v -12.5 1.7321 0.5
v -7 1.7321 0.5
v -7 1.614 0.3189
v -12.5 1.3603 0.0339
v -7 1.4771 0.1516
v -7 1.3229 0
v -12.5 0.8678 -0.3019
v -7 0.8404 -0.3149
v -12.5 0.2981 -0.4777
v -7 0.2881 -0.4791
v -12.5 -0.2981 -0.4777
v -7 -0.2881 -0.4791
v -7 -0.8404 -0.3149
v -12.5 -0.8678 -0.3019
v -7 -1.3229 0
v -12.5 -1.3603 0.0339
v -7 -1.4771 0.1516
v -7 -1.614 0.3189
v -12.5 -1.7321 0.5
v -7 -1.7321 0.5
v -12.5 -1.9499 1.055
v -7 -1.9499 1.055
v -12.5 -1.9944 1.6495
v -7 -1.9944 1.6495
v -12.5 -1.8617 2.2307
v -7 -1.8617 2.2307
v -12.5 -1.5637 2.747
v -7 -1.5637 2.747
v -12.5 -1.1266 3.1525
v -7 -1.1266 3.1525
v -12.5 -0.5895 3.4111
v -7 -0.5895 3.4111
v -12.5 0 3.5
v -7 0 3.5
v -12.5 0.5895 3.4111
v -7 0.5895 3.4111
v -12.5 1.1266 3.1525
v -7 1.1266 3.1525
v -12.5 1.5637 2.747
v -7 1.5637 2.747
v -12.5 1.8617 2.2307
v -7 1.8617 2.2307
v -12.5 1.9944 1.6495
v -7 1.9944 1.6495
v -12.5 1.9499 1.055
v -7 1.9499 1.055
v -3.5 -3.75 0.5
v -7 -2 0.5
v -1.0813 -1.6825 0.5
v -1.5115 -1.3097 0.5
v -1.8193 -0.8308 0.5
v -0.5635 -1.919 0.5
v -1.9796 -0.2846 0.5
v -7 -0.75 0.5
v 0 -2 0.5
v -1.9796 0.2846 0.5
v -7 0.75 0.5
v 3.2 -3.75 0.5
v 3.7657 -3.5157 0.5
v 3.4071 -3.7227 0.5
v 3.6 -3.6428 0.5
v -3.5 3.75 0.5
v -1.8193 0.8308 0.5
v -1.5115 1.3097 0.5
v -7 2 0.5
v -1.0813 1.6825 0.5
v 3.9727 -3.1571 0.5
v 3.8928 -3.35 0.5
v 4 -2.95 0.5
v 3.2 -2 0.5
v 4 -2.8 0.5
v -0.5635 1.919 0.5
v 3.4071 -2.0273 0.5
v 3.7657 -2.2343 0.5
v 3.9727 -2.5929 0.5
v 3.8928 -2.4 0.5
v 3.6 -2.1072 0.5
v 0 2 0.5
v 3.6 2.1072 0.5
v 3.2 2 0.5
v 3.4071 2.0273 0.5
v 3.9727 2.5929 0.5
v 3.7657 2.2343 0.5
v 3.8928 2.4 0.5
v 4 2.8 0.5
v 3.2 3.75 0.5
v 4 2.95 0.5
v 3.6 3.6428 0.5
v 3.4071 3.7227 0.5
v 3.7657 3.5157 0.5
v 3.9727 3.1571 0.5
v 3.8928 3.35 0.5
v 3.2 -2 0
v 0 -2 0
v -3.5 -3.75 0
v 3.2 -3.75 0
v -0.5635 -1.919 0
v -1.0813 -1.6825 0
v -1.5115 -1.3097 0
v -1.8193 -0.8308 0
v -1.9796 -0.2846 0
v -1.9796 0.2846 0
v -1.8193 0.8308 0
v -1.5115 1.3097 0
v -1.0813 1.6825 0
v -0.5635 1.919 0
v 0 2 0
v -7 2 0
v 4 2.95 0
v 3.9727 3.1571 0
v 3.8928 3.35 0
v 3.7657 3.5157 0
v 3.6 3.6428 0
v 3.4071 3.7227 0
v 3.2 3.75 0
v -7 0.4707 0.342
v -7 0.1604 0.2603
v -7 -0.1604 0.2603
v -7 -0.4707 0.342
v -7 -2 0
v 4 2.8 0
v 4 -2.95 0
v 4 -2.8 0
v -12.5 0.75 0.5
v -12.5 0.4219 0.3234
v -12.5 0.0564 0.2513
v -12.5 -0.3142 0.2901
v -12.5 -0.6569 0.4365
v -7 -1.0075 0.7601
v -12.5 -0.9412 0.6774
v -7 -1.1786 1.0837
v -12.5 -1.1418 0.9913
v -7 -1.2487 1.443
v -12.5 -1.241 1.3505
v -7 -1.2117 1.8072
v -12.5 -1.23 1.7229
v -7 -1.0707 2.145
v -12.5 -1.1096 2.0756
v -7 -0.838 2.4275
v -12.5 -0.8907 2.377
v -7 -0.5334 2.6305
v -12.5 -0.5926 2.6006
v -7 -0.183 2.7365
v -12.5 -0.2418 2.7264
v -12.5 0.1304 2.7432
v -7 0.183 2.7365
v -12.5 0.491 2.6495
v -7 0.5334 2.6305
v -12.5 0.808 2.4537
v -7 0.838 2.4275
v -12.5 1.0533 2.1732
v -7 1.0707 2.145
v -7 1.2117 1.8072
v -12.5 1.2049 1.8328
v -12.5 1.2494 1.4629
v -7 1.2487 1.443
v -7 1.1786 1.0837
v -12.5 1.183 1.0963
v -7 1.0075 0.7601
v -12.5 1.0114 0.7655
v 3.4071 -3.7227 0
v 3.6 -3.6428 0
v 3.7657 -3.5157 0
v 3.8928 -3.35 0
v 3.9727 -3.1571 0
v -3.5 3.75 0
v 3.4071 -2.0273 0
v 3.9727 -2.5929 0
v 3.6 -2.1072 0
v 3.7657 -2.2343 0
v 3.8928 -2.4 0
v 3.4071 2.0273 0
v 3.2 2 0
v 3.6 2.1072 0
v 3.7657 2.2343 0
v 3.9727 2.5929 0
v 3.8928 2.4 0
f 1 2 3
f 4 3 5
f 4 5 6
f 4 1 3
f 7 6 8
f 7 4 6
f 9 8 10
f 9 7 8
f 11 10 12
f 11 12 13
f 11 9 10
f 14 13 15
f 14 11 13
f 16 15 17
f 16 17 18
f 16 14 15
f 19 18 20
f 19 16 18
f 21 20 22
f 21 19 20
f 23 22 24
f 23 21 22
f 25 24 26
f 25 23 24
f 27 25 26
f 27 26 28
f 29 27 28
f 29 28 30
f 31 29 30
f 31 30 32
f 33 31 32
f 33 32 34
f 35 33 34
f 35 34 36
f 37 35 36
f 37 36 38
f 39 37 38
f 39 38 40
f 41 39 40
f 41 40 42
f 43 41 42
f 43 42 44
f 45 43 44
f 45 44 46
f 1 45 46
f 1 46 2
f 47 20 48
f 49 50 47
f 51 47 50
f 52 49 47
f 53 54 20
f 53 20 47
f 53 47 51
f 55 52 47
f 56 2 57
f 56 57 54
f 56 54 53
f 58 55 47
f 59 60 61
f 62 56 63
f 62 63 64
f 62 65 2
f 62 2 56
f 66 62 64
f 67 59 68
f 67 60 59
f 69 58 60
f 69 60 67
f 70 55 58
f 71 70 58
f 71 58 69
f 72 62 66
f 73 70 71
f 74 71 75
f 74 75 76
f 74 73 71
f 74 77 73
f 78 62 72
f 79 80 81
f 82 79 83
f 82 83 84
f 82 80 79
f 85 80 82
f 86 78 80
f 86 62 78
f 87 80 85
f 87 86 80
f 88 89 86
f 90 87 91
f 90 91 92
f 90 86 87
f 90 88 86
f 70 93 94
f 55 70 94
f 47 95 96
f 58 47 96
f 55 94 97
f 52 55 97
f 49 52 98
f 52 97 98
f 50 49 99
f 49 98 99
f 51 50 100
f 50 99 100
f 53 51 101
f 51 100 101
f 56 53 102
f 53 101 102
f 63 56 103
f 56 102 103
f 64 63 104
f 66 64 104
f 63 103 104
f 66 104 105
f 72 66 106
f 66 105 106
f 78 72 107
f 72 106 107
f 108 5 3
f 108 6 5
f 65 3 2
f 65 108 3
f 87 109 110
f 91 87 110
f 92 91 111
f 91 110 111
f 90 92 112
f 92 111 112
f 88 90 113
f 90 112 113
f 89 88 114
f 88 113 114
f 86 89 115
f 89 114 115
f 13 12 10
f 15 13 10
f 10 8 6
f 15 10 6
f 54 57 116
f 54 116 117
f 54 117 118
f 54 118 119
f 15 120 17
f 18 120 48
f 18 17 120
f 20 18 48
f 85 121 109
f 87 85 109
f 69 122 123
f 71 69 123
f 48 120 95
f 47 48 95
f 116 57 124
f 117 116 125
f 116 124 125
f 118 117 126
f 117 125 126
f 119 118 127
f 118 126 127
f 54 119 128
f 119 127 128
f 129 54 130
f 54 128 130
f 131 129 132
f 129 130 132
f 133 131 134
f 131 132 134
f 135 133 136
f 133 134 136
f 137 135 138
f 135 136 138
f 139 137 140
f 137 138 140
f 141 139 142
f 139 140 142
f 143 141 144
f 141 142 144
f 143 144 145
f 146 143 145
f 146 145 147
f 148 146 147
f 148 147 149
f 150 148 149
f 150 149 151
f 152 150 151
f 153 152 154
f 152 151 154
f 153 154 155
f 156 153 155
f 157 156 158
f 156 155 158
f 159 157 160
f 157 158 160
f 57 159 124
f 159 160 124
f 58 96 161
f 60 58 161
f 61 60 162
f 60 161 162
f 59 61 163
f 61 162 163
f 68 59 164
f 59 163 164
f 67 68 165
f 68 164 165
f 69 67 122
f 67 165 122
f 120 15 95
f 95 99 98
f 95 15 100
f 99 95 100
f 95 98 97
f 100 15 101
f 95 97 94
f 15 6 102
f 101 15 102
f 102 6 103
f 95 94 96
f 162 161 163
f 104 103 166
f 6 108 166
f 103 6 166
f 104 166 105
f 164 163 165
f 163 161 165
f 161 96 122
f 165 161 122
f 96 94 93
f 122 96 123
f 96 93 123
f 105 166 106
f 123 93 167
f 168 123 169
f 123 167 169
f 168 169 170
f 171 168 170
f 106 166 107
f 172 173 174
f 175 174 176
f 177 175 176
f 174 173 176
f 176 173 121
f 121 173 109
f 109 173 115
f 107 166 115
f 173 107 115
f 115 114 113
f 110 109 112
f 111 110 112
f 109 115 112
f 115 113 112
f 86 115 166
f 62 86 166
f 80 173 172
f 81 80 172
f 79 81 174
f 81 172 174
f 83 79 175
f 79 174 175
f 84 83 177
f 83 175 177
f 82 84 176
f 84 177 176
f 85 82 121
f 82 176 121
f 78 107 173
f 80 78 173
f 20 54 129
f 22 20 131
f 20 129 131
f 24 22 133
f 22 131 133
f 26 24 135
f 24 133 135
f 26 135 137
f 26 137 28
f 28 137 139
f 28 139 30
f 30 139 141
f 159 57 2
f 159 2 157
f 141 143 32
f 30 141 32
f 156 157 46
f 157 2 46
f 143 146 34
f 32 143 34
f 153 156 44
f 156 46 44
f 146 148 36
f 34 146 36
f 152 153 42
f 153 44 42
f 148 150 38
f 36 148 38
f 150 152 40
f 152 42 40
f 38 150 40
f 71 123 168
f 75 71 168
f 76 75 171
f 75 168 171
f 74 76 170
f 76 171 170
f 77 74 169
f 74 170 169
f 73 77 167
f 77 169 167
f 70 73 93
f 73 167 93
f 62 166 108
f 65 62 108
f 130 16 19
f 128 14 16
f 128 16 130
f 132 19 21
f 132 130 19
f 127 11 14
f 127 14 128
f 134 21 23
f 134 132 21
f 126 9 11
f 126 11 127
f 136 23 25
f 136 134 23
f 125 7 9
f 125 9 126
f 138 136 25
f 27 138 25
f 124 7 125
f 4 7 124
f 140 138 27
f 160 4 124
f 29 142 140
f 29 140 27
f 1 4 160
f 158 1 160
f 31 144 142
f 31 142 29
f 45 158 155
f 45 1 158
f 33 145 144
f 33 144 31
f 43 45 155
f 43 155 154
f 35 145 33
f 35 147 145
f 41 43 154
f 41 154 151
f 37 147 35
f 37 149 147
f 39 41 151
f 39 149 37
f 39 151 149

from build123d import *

# Parameters (mm, degrees)
EXTRUDE_1_DEPTH     = 0.5
SKETCH_2_R          = 2
SKETCH_2_R_2        = 1.25
EXTRUDE_2_DEPTH     = 5.5
SKETCH_3_R          = 1.25
CUT_EXTRUDE_1_DEPTH = 5.5
SKETCH_4_R          = 4
SKETCH_4_R_2        = 2
CUT_EXTRUDE_2_DEPTH = 5.5


with BuildPart() as part:
    # 草图1 → 凸台-拉伸1 (new body)
    with BuildSketch(Plane.XY):
        with BuildLine():
            Line((0, 2), (3.2, 2))
            ThreePointArc((3.2, 2), (3.765685425, 2.234314575), (4, 2.8))
            Line((4, 2.8), (4, 2.95))
            ThreePointArc((4, 2.95), (3.765685425, 3.515685425), (3.2, 3.75))
            Line((3.2, 3.75), (-3.5, 3.75))
            Line((-3.5, 3.75), (-7, 2))
            Line((-7, 2), (-12.5, 2))
            Line((-12.5, 2), (-12.5, -2))
            Line((-12.5, -2), (-7, -2))
            Line((-7, -2), (-3.5, -3.75))
            Line((-3.5, -3.75), (3.2, -3.75))
            ThreePointArc((3.2, -3.75), (3.765685425, -3.515685425), (4, -2.95))
            Line((4, -2.95), (4, -2.8))
            ThreePointArc((4, -2.8), (3.765685425, -2.234314575), (3.2, -2))
            Line((3.2, -2), (0, -2))
            ThreePointArc((0, -2), (-2, 0), (0, 2))
        make_face()
    extrude(amount=EXTRUDE_1_DEPTH)

    # 草图2 → 凸台-拉伸2 (add)
    with BuildSketch(Plane.ZY.offset(12.5)):
        with Locations((1.5, 0)):
            Circle(SKETCH_2_R)
        with Locations((1.5, 0)):
            Circle(SKETCH_2_R_2, mode=Mode.SUBTRACT)
    extrude(amount=-EXTRUDE_2_DEPTH)

    # 草图3 → 切除-拉伸1 (cut)
    with BuildSketch(Plane.ZY.offset(12.5)):
        with Locations((1.5, 0)):
            Circle(SKETCH_3_R)
    extrude(amount=-CUT_EXTRUDE_1_DEPTH, mode=Mode.SUBTRACT)

    # 草图4 → 切除-拉伸2 (cut)
    with BuildSketch(Plane.ZY.offset(12.5)):
        with Locations((1.5, 0)):
            Circle(SKETCH_4_R)
        with Locations((1.5, 0)):
            Circle(SKETCH_4_R_2, mode=Mode.SUBTRACT)
    extrude(amount=-CUT_EXTRUDE_2_DEPTH, mode=Mode.SUBTRACT)


solid = part.part
